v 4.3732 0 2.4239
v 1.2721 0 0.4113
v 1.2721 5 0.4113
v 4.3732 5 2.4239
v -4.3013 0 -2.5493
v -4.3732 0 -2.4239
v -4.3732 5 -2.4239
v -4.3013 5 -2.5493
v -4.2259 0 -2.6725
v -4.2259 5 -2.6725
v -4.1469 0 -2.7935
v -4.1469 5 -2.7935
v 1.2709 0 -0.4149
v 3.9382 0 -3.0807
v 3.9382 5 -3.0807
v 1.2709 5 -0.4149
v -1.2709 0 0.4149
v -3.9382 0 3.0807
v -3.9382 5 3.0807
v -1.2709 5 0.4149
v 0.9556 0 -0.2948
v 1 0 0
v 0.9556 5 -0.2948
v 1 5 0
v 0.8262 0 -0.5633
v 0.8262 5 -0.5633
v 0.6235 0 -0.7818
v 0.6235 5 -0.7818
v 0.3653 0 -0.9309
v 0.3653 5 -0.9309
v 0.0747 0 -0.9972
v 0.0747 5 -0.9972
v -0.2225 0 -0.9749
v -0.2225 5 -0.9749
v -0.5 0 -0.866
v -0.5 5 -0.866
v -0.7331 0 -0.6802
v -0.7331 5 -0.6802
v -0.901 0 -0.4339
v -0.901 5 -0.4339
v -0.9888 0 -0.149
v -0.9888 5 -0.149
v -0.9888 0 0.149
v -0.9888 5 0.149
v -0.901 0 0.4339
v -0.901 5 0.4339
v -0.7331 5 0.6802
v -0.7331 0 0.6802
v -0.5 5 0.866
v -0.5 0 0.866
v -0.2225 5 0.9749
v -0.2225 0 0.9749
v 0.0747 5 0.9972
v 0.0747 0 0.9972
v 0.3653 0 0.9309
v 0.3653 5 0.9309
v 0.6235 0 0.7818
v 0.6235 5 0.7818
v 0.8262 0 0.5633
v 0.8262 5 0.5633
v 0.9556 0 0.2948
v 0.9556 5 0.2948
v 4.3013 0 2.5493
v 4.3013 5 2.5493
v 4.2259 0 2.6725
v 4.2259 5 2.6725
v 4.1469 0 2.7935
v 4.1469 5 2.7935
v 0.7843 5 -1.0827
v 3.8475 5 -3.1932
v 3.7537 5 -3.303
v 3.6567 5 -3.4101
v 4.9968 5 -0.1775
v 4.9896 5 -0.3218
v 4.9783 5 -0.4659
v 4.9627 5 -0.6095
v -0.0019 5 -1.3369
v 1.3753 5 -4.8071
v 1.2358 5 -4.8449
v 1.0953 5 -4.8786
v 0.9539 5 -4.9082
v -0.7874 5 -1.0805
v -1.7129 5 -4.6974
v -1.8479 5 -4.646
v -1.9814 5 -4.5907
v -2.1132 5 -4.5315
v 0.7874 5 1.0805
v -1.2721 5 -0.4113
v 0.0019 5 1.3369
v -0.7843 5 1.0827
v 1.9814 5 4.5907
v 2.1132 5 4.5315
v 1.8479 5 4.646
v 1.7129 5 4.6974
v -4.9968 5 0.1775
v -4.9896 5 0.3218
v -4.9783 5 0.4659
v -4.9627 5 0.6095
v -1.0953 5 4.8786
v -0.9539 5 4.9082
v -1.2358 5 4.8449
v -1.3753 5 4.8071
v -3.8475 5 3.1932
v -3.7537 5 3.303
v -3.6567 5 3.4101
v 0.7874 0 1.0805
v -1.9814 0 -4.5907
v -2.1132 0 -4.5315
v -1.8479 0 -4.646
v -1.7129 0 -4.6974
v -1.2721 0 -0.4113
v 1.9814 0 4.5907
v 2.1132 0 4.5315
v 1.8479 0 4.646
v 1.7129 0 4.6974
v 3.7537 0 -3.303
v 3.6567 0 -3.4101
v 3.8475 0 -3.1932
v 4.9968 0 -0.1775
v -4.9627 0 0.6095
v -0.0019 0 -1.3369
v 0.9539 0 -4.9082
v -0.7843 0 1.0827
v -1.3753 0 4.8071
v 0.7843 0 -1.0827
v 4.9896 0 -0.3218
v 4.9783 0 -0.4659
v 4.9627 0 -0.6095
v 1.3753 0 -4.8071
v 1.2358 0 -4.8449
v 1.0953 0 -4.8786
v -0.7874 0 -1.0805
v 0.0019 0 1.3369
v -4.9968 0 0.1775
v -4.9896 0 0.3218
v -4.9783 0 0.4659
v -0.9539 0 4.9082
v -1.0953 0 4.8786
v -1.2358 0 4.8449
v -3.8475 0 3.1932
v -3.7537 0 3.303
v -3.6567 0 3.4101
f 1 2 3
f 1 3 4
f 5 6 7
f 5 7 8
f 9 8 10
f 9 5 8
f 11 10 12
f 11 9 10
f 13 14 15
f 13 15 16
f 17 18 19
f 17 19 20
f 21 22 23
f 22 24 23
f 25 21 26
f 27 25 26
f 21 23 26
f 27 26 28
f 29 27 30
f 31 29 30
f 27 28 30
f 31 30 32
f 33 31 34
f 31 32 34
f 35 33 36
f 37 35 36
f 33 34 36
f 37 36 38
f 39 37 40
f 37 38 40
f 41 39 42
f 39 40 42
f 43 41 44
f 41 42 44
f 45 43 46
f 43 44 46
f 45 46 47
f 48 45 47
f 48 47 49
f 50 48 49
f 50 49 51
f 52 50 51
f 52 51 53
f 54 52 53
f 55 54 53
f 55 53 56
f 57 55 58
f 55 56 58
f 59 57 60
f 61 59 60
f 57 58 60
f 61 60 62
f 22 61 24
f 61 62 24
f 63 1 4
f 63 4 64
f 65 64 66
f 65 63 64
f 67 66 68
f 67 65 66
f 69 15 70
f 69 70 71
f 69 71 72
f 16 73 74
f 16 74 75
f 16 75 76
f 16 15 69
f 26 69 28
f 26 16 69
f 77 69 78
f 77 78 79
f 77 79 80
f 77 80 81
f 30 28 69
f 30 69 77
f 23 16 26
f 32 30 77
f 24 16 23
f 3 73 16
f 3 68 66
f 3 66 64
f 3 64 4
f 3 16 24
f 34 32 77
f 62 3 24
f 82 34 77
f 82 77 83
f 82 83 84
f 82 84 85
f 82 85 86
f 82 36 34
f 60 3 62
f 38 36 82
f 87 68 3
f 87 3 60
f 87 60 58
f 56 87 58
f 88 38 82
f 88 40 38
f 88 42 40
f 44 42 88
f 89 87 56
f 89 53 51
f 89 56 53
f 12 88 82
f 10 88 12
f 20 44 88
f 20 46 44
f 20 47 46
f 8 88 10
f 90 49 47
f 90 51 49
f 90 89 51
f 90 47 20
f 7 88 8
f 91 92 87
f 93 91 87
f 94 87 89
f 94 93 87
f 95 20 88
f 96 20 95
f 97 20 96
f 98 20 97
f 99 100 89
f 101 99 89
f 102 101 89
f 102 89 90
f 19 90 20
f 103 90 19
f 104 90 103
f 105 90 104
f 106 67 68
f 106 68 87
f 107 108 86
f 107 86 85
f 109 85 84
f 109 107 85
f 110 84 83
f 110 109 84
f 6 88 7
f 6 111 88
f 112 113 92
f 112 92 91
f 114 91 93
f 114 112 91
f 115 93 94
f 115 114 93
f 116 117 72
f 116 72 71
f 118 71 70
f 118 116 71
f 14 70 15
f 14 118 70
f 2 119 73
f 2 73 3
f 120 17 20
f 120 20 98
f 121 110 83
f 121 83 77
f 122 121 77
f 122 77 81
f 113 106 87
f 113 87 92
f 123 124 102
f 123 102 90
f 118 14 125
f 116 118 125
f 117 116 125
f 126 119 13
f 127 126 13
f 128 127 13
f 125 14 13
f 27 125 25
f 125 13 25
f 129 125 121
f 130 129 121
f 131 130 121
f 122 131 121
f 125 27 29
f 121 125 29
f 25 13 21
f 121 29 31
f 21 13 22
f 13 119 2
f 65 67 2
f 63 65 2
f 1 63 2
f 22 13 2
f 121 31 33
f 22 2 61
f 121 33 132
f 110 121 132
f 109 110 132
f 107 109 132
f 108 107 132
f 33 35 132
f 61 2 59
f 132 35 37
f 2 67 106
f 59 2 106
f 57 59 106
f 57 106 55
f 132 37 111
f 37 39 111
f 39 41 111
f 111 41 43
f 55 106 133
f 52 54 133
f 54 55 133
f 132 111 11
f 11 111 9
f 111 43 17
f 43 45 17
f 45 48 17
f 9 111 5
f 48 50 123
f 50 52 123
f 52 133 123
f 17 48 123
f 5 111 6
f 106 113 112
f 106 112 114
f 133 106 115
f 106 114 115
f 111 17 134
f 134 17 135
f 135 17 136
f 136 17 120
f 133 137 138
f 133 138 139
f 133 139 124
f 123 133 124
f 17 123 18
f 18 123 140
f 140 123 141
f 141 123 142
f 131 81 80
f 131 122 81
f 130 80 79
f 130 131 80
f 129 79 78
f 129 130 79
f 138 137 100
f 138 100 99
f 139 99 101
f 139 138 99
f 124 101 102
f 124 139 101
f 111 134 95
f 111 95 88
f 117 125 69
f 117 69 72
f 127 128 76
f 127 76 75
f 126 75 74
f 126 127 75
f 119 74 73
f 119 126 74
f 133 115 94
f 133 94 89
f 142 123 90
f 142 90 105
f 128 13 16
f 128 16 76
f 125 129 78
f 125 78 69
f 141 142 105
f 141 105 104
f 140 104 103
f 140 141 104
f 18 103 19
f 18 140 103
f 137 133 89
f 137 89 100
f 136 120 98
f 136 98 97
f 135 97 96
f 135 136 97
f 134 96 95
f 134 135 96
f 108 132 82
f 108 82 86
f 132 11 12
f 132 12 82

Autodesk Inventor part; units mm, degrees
ref_plane "YZ Plane" through (0, 0, 0) normal (1, 0, 0) x (0, 1, 0)
ref_plane "XZ Plane" through (0, 0, 0) normal (0, 1, 0) x (-1, 0, 0)
ref_plane "XY Plane" through (0, 0, 0) normal (0, 0, 1) x (1, 0, 0)
sketch "Sketch1" plane through (0, 0, 0) normal (0, 1, 0) x (-1, 0, 0)
  circle A0 centre (0, 0) radius 5
  line L0 (1.7129, -4.6974) -> (0.0019, -1.3369)
  line L1 (0.0019, -1.3369) -> (-0.9539, -4.9082)
  line L2 (4.1469, -2.7935) -> (0.7874, -1.0805)
  line L3 (0.7874, -1.0805) -> (2.1132, -4.5315)
  line L4 (4.9968, 0.1775) -> (1.2721, -0.4113)
  line L5 (1.2721, -0.4113) -> (4.3732, -2.4239)
  line L6 (3.9382, 3.0807) -> (1.2709, 0.4149)
  line L7 (1.2709, 0.4149) -> (4.9627, 0.6095)
  line L8 (1.3753, 4.8071) -> (0.7843, 1.0827)
  line L9 (0.7843, 1.0827) -> (3.6567, 3.4101)
  line L10 (-1.7129, 4.6974) -> (-0.0019, 1.3369)
  line L11 (-0.0019, 1.3369) -> (0.9539, 4.9082)
  line L12 (-4.1469, 2.7935) -> (-0.7874, 1.0805)
  line L13 (-0.7874, 1.0805) -> (-2.1132, 4.5315)
  line L14 (-4.9968, -0.1775) -> (-1.2721, 0.4113)
  line L15 (-1.2721, 0.4113) -> (-4.3732, 2.4239)
  line L16 (-3.9382, -3.0807) -> (-1.2709, -0.4149)
  line L17 (-1.2709, -0.4149) -> (-4.9627, -0.6095)
  line L18 (-1.3753, -4.8071) -> (-0.7843, -1.0827)
  line L19 (-0.7843, -1.0827) -> (-3.6567, -3.4101)
  dimension "d0" = 10
  dimension "d3" = 360
extrude "Extrusion1" add sketch "Sketch1" along normal blind 5 contours L4 L5 A0 L2 L3 L0 L1 L18 L19 L16 L17 L14 L15 L12 L13 L10 L11 L8 L9 L6 L7
sketch "Sketch2" plane through (0, 5, 0) normal (0, 1, 0) x (1, 0, 0)
  circle A0 centre (0, 0) radius 1
  dimension "d7" = 2
extrude "Extrusion2" cut sketch "Sketch2" against normal blind 5
properties part number "10ToothGear"
